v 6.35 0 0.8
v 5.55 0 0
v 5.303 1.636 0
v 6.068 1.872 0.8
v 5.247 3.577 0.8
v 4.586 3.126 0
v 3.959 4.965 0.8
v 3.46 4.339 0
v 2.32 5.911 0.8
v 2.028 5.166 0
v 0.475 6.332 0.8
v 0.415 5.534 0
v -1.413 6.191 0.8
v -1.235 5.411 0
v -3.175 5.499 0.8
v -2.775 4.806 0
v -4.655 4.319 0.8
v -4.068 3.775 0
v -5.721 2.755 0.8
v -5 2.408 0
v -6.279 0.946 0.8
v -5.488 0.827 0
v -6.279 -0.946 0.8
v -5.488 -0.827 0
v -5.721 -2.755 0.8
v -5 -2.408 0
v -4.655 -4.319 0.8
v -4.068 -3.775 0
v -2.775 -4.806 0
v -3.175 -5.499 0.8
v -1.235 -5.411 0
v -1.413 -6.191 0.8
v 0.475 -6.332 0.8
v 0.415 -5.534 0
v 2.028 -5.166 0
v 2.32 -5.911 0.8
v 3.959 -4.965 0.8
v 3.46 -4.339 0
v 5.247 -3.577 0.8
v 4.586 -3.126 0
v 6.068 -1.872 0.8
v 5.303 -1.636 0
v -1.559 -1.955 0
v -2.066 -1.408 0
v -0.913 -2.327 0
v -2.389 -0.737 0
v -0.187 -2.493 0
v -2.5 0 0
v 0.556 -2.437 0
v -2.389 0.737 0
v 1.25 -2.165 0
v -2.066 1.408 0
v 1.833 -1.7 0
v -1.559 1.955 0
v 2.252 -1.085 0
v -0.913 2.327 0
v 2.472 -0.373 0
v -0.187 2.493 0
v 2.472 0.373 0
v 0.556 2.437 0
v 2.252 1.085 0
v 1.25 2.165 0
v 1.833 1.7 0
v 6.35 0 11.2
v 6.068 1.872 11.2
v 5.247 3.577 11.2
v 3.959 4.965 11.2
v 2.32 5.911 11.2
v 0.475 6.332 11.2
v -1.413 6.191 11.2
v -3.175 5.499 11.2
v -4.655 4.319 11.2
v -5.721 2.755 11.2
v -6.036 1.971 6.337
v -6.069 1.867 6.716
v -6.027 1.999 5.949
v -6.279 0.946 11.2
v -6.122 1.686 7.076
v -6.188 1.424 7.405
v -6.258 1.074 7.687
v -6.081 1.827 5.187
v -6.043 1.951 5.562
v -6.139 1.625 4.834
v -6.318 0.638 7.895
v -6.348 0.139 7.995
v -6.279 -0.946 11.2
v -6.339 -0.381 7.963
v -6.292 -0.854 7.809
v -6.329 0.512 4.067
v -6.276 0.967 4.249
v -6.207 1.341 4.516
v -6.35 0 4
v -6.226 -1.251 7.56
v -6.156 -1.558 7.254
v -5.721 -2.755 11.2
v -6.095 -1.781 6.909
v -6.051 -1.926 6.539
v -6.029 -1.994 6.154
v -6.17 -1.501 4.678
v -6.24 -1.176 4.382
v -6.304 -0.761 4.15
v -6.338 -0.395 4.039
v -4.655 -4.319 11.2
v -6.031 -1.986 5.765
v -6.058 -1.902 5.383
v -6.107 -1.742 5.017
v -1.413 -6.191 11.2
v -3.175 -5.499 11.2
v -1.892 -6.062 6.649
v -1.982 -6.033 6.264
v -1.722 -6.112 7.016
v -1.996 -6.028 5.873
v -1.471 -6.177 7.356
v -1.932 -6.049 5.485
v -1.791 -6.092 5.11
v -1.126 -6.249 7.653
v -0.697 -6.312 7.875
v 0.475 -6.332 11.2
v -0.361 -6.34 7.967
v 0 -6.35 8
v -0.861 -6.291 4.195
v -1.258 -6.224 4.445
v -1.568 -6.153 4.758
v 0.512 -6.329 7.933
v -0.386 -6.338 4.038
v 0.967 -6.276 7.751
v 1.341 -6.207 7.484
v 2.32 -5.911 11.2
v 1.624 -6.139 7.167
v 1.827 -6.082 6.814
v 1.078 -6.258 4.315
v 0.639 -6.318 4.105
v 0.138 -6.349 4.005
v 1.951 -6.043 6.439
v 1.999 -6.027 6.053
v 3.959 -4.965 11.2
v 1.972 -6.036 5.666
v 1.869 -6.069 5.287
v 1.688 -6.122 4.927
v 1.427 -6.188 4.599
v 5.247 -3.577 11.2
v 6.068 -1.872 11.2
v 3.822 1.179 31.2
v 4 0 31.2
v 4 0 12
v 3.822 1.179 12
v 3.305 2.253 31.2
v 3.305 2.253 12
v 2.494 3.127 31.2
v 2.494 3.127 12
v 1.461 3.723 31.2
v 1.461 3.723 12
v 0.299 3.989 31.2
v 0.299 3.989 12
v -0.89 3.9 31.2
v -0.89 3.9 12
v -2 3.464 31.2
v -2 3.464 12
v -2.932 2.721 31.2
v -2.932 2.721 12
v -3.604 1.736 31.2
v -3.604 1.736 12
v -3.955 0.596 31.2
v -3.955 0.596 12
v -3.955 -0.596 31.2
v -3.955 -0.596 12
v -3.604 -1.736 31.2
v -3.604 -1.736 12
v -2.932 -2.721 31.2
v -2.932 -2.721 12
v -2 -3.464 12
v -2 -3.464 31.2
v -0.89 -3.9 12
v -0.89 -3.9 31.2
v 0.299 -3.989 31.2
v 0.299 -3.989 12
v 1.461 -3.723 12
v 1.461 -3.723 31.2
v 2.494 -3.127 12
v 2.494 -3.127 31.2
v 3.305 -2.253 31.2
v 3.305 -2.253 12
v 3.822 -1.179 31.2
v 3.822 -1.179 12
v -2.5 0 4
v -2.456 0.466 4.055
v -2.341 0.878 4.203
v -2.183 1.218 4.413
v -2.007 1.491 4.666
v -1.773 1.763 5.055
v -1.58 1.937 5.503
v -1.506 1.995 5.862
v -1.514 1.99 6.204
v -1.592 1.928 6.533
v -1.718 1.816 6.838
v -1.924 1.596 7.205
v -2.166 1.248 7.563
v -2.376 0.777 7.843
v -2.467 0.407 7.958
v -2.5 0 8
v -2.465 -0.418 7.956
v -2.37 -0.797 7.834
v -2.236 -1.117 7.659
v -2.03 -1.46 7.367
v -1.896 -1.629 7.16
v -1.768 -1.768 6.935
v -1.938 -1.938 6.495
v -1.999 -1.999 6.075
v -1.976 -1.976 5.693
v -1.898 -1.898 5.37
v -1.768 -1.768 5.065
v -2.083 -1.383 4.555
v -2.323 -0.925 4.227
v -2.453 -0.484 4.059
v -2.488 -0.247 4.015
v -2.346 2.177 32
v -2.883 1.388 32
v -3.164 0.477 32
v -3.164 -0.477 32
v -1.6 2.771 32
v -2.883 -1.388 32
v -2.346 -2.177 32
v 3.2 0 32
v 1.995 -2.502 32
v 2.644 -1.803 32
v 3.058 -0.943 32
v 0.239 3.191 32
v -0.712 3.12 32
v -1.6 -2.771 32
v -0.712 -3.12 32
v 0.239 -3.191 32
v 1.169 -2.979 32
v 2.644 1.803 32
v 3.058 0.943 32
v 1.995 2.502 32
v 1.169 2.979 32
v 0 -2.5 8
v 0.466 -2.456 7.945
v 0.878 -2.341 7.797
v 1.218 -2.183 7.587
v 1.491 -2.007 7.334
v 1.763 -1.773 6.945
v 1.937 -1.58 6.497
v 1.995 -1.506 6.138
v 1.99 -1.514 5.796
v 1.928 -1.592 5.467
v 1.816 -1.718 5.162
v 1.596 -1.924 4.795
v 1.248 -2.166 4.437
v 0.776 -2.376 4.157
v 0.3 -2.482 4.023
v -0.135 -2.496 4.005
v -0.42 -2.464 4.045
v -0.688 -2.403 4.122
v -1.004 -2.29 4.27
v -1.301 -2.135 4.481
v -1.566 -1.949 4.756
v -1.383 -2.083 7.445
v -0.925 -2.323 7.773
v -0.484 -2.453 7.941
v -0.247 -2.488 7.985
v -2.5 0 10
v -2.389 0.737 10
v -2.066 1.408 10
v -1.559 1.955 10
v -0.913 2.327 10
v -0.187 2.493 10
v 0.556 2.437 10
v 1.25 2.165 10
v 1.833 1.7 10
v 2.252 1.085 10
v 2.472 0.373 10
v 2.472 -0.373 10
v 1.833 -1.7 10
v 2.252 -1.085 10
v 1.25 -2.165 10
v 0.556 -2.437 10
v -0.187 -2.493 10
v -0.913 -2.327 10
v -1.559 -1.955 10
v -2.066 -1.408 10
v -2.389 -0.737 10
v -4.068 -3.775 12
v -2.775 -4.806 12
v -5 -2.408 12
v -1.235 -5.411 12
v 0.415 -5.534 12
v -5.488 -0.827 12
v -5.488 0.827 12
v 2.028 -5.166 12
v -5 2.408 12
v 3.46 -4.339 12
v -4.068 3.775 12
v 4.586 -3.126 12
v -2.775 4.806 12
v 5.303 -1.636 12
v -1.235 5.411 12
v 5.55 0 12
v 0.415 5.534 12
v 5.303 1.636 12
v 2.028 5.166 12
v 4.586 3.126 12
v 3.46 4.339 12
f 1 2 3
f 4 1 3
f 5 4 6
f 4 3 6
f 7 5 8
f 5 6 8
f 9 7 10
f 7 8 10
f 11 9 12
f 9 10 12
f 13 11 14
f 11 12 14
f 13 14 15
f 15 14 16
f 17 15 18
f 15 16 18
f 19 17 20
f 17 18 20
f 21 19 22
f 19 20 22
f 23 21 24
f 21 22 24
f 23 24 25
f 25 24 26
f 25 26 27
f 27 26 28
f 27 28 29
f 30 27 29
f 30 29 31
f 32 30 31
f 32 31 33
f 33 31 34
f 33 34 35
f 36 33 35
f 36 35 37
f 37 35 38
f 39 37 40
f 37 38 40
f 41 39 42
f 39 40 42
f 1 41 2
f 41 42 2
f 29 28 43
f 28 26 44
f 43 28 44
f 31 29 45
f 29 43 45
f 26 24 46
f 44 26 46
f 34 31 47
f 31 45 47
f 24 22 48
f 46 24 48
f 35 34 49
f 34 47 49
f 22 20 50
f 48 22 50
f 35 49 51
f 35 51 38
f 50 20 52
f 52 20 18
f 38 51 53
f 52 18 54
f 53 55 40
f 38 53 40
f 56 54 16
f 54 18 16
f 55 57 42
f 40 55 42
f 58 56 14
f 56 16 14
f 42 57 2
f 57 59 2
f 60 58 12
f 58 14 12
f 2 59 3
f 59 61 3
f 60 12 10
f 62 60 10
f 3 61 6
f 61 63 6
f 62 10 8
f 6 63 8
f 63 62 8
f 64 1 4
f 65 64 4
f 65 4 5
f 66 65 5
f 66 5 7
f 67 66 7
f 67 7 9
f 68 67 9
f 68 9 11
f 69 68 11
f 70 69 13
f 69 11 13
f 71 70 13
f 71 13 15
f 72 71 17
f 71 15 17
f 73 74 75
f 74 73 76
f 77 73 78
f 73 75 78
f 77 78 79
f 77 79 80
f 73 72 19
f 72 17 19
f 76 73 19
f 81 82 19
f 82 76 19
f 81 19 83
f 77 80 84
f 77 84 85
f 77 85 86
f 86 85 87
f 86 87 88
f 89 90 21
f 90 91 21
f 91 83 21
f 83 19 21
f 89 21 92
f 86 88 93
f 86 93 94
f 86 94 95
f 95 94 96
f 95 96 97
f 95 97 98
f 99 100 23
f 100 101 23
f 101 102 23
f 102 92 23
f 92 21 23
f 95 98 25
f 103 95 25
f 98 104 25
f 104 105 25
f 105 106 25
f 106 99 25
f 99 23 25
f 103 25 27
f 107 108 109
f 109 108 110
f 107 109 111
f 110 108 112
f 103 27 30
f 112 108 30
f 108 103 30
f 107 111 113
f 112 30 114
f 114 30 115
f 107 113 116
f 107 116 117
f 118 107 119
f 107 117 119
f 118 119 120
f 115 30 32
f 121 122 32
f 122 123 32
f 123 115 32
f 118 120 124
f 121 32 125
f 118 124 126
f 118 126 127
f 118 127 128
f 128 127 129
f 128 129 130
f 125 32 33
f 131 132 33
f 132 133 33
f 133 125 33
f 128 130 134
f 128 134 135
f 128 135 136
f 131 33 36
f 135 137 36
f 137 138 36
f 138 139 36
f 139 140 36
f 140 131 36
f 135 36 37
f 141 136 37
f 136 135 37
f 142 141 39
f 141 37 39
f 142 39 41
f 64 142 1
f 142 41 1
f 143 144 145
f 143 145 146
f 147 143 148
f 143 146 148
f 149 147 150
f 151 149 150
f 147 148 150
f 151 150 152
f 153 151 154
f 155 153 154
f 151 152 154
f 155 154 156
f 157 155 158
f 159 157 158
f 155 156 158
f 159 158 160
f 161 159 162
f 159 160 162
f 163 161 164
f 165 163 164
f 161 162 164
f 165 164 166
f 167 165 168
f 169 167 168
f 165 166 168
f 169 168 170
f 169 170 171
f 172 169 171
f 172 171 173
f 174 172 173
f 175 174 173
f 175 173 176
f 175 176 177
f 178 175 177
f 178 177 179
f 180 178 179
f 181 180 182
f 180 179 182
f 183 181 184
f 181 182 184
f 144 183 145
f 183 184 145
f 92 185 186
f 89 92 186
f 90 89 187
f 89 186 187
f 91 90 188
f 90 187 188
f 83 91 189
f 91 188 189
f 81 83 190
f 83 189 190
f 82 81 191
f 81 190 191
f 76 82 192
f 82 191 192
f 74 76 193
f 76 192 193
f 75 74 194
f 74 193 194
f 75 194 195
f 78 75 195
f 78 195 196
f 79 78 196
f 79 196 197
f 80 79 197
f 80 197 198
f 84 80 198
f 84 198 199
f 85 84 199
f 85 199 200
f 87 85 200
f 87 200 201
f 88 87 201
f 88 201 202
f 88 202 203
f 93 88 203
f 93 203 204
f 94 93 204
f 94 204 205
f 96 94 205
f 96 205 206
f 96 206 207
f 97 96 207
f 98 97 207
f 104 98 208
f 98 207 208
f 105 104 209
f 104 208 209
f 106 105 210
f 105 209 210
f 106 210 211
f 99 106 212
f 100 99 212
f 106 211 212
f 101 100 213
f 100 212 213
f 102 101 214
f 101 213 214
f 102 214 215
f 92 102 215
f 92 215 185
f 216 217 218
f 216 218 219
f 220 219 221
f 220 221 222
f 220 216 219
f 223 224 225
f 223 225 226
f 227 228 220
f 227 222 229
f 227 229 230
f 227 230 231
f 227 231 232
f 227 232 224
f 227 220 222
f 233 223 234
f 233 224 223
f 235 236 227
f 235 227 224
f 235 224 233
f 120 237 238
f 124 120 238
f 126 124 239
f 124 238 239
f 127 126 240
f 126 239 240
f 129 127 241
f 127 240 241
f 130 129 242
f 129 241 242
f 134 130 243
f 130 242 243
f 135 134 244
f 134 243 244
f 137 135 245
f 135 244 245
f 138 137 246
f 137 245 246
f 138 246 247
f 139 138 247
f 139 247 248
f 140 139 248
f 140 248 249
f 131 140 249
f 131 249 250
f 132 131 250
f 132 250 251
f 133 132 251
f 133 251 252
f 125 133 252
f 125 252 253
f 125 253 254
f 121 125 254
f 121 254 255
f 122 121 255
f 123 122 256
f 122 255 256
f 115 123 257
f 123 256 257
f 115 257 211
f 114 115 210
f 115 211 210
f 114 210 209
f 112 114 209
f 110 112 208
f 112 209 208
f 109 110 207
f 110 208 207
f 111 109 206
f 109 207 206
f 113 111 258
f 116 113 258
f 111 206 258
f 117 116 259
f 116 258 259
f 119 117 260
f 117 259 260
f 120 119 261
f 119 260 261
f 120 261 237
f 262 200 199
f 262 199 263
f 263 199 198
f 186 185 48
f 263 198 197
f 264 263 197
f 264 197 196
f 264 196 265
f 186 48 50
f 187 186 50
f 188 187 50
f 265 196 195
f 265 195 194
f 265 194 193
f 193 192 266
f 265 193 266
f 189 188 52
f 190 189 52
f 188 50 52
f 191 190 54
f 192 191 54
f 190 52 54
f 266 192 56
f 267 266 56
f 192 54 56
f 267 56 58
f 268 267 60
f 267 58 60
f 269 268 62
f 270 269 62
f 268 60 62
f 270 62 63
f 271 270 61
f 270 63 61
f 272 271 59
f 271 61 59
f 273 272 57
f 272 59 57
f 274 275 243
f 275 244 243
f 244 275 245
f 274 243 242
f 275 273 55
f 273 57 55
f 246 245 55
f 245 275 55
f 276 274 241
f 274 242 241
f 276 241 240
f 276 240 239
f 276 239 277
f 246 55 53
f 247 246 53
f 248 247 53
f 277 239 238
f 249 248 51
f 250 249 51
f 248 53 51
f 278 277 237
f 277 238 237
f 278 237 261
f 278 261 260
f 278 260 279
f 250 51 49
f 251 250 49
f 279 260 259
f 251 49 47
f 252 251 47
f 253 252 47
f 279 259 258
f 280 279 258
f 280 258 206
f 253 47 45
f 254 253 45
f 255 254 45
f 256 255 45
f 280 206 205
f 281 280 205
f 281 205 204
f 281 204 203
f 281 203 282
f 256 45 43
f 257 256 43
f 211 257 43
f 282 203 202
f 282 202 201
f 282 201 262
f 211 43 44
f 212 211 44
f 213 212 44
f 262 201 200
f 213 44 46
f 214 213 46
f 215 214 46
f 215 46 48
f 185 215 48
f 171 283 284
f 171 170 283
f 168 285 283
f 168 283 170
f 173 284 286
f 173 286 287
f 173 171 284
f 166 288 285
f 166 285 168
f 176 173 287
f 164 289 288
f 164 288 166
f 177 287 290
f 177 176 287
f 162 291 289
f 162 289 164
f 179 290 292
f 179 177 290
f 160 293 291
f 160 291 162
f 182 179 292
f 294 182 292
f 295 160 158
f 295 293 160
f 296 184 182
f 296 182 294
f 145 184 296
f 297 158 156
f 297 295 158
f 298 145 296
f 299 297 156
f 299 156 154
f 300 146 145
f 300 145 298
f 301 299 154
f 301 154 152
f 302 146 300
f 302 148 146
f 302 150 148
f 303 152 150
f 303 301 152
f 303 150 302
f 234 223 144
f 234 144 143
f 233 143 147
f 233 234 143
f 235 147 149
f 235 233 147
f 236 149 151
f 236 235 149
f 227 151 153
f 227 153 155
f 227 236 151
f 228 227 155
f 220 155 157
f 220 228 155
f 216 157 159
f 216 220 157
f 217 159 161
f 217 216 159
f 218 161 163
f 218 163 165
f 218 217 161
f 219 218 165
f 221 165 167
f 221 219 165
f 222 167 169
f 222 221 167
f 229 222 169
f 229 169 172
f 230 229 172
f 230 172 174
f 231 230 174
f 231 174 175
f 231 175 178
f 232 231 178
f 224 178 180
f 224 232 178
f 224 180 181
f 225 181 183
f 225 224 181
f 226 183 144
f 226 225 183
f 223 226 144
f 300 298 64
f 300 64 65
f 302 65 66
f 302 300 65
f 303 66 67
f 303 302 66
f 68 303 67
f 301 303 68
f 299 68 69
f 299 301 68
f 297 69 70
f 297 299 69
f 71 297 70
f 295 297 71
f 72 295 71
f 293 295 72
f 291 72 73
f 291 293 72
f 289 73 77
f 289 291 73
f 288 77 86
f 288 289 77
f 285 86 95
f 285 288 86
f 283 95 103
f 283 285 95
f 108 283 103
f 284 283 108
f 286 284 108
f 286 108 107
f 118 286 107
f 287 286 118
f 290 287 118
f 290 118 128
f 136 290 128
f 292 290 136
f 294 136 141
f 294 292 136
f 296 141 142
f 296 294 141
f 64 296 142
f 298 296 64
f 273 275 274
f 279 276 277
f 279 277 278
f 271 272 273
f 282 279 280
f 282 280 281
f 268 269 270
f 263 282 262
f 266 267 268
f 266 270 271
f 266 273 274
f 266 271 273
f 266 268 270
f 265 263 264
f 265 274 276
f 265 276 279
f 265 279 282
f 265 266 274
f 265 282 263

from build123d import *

# Parameters (mm, degrees)
CROQUIS1_R              = 6.35
SALIENTE_EXTRUIR1_DEPTH = 12
CROQUIS2_R              = 4
SALIENTE_EXTRUIR2_DEPTH = 20
CROQUIS3_R              = 2.5
CORTAR_EXTRUIR1_DEPTH   = 10
CROQUIS4_R              = 2
CORTAR_EXTRUIR2_DEPTH   = 34.236200144
CROQUIS5_R              = 2
CORTAR_EXTRUIR3_DEPTH   = 34.236200182
CHAFL_N1_SIZE           = 0.8


with BuildPart() as part:
    # Croquis1 → Saliente-Extruir1 (new body)
    with BuildSketch(Plane.XY):
        Circle(CROQUIS1_R)
    extrude(amount=SALIENTE_EXTRUIR1_DEPTH)

    # Croquis2 → Saliente-Extruir2 (add)
    with BuildSketch(Plane.XY.offset(12)):
        Circle(CROQUIS2_R)
    extrude(amount=SALIENTE_EXTRUIR2_DEPTH)

    # Croquis3 → Cortar-Extruir1 (cut)
    with BuildSketch(Plane(origin=(0, 0, 0), x_dir=(-1, 0, 0), z_dir=(0, 0, -1))):
        Circle(CROQUIS3_R)
    extrude(amount=-CORTAR_EXTRUIR1_DEPTH, mode=Mode.SUBTRACT)

    # Croquis4 → Cortar-Extruir2 (cut, through all)
    with BuildSketch(Plane(origin=(0, 0, 0), x_dir=(0, 0, -1), z_dir=(1, 0, 0))):
        with Locations((-6, 0)):
            Circle(CROQUIS4_R)
    extrude(amount=-CORTAR_EXTRUIR2_DEPTH, mode=Mode.SUBTRACT)

    # Croquis5 → Cortar-Extruir3 (cut, through all)
    with BuildSketch(Plane(origin=(0, 0, 0), x_dir=(1, 0, 0), z_dir=(0, 1, 0))):
        with Locations(Location((0, -6, 0), (0, 0, 270))):
            Circle(CROQUIS5_R)
    extrude(amount=-CORTAR_EXTRUIR3_DEPTH, mode=Mode.SUBTRACT)

    # Chaflán1
    chafl_n1_edges = [part.edges().sort_by_distance(p)[0] for p in [
        (-6.35, 0, 0),
        (-6.35, 0, 12),
        (-4, 0, 32),
    ]]
    chamfer(chafl_n1_edges, length=CHAFL_N1_SIZE)


solid = part.part
